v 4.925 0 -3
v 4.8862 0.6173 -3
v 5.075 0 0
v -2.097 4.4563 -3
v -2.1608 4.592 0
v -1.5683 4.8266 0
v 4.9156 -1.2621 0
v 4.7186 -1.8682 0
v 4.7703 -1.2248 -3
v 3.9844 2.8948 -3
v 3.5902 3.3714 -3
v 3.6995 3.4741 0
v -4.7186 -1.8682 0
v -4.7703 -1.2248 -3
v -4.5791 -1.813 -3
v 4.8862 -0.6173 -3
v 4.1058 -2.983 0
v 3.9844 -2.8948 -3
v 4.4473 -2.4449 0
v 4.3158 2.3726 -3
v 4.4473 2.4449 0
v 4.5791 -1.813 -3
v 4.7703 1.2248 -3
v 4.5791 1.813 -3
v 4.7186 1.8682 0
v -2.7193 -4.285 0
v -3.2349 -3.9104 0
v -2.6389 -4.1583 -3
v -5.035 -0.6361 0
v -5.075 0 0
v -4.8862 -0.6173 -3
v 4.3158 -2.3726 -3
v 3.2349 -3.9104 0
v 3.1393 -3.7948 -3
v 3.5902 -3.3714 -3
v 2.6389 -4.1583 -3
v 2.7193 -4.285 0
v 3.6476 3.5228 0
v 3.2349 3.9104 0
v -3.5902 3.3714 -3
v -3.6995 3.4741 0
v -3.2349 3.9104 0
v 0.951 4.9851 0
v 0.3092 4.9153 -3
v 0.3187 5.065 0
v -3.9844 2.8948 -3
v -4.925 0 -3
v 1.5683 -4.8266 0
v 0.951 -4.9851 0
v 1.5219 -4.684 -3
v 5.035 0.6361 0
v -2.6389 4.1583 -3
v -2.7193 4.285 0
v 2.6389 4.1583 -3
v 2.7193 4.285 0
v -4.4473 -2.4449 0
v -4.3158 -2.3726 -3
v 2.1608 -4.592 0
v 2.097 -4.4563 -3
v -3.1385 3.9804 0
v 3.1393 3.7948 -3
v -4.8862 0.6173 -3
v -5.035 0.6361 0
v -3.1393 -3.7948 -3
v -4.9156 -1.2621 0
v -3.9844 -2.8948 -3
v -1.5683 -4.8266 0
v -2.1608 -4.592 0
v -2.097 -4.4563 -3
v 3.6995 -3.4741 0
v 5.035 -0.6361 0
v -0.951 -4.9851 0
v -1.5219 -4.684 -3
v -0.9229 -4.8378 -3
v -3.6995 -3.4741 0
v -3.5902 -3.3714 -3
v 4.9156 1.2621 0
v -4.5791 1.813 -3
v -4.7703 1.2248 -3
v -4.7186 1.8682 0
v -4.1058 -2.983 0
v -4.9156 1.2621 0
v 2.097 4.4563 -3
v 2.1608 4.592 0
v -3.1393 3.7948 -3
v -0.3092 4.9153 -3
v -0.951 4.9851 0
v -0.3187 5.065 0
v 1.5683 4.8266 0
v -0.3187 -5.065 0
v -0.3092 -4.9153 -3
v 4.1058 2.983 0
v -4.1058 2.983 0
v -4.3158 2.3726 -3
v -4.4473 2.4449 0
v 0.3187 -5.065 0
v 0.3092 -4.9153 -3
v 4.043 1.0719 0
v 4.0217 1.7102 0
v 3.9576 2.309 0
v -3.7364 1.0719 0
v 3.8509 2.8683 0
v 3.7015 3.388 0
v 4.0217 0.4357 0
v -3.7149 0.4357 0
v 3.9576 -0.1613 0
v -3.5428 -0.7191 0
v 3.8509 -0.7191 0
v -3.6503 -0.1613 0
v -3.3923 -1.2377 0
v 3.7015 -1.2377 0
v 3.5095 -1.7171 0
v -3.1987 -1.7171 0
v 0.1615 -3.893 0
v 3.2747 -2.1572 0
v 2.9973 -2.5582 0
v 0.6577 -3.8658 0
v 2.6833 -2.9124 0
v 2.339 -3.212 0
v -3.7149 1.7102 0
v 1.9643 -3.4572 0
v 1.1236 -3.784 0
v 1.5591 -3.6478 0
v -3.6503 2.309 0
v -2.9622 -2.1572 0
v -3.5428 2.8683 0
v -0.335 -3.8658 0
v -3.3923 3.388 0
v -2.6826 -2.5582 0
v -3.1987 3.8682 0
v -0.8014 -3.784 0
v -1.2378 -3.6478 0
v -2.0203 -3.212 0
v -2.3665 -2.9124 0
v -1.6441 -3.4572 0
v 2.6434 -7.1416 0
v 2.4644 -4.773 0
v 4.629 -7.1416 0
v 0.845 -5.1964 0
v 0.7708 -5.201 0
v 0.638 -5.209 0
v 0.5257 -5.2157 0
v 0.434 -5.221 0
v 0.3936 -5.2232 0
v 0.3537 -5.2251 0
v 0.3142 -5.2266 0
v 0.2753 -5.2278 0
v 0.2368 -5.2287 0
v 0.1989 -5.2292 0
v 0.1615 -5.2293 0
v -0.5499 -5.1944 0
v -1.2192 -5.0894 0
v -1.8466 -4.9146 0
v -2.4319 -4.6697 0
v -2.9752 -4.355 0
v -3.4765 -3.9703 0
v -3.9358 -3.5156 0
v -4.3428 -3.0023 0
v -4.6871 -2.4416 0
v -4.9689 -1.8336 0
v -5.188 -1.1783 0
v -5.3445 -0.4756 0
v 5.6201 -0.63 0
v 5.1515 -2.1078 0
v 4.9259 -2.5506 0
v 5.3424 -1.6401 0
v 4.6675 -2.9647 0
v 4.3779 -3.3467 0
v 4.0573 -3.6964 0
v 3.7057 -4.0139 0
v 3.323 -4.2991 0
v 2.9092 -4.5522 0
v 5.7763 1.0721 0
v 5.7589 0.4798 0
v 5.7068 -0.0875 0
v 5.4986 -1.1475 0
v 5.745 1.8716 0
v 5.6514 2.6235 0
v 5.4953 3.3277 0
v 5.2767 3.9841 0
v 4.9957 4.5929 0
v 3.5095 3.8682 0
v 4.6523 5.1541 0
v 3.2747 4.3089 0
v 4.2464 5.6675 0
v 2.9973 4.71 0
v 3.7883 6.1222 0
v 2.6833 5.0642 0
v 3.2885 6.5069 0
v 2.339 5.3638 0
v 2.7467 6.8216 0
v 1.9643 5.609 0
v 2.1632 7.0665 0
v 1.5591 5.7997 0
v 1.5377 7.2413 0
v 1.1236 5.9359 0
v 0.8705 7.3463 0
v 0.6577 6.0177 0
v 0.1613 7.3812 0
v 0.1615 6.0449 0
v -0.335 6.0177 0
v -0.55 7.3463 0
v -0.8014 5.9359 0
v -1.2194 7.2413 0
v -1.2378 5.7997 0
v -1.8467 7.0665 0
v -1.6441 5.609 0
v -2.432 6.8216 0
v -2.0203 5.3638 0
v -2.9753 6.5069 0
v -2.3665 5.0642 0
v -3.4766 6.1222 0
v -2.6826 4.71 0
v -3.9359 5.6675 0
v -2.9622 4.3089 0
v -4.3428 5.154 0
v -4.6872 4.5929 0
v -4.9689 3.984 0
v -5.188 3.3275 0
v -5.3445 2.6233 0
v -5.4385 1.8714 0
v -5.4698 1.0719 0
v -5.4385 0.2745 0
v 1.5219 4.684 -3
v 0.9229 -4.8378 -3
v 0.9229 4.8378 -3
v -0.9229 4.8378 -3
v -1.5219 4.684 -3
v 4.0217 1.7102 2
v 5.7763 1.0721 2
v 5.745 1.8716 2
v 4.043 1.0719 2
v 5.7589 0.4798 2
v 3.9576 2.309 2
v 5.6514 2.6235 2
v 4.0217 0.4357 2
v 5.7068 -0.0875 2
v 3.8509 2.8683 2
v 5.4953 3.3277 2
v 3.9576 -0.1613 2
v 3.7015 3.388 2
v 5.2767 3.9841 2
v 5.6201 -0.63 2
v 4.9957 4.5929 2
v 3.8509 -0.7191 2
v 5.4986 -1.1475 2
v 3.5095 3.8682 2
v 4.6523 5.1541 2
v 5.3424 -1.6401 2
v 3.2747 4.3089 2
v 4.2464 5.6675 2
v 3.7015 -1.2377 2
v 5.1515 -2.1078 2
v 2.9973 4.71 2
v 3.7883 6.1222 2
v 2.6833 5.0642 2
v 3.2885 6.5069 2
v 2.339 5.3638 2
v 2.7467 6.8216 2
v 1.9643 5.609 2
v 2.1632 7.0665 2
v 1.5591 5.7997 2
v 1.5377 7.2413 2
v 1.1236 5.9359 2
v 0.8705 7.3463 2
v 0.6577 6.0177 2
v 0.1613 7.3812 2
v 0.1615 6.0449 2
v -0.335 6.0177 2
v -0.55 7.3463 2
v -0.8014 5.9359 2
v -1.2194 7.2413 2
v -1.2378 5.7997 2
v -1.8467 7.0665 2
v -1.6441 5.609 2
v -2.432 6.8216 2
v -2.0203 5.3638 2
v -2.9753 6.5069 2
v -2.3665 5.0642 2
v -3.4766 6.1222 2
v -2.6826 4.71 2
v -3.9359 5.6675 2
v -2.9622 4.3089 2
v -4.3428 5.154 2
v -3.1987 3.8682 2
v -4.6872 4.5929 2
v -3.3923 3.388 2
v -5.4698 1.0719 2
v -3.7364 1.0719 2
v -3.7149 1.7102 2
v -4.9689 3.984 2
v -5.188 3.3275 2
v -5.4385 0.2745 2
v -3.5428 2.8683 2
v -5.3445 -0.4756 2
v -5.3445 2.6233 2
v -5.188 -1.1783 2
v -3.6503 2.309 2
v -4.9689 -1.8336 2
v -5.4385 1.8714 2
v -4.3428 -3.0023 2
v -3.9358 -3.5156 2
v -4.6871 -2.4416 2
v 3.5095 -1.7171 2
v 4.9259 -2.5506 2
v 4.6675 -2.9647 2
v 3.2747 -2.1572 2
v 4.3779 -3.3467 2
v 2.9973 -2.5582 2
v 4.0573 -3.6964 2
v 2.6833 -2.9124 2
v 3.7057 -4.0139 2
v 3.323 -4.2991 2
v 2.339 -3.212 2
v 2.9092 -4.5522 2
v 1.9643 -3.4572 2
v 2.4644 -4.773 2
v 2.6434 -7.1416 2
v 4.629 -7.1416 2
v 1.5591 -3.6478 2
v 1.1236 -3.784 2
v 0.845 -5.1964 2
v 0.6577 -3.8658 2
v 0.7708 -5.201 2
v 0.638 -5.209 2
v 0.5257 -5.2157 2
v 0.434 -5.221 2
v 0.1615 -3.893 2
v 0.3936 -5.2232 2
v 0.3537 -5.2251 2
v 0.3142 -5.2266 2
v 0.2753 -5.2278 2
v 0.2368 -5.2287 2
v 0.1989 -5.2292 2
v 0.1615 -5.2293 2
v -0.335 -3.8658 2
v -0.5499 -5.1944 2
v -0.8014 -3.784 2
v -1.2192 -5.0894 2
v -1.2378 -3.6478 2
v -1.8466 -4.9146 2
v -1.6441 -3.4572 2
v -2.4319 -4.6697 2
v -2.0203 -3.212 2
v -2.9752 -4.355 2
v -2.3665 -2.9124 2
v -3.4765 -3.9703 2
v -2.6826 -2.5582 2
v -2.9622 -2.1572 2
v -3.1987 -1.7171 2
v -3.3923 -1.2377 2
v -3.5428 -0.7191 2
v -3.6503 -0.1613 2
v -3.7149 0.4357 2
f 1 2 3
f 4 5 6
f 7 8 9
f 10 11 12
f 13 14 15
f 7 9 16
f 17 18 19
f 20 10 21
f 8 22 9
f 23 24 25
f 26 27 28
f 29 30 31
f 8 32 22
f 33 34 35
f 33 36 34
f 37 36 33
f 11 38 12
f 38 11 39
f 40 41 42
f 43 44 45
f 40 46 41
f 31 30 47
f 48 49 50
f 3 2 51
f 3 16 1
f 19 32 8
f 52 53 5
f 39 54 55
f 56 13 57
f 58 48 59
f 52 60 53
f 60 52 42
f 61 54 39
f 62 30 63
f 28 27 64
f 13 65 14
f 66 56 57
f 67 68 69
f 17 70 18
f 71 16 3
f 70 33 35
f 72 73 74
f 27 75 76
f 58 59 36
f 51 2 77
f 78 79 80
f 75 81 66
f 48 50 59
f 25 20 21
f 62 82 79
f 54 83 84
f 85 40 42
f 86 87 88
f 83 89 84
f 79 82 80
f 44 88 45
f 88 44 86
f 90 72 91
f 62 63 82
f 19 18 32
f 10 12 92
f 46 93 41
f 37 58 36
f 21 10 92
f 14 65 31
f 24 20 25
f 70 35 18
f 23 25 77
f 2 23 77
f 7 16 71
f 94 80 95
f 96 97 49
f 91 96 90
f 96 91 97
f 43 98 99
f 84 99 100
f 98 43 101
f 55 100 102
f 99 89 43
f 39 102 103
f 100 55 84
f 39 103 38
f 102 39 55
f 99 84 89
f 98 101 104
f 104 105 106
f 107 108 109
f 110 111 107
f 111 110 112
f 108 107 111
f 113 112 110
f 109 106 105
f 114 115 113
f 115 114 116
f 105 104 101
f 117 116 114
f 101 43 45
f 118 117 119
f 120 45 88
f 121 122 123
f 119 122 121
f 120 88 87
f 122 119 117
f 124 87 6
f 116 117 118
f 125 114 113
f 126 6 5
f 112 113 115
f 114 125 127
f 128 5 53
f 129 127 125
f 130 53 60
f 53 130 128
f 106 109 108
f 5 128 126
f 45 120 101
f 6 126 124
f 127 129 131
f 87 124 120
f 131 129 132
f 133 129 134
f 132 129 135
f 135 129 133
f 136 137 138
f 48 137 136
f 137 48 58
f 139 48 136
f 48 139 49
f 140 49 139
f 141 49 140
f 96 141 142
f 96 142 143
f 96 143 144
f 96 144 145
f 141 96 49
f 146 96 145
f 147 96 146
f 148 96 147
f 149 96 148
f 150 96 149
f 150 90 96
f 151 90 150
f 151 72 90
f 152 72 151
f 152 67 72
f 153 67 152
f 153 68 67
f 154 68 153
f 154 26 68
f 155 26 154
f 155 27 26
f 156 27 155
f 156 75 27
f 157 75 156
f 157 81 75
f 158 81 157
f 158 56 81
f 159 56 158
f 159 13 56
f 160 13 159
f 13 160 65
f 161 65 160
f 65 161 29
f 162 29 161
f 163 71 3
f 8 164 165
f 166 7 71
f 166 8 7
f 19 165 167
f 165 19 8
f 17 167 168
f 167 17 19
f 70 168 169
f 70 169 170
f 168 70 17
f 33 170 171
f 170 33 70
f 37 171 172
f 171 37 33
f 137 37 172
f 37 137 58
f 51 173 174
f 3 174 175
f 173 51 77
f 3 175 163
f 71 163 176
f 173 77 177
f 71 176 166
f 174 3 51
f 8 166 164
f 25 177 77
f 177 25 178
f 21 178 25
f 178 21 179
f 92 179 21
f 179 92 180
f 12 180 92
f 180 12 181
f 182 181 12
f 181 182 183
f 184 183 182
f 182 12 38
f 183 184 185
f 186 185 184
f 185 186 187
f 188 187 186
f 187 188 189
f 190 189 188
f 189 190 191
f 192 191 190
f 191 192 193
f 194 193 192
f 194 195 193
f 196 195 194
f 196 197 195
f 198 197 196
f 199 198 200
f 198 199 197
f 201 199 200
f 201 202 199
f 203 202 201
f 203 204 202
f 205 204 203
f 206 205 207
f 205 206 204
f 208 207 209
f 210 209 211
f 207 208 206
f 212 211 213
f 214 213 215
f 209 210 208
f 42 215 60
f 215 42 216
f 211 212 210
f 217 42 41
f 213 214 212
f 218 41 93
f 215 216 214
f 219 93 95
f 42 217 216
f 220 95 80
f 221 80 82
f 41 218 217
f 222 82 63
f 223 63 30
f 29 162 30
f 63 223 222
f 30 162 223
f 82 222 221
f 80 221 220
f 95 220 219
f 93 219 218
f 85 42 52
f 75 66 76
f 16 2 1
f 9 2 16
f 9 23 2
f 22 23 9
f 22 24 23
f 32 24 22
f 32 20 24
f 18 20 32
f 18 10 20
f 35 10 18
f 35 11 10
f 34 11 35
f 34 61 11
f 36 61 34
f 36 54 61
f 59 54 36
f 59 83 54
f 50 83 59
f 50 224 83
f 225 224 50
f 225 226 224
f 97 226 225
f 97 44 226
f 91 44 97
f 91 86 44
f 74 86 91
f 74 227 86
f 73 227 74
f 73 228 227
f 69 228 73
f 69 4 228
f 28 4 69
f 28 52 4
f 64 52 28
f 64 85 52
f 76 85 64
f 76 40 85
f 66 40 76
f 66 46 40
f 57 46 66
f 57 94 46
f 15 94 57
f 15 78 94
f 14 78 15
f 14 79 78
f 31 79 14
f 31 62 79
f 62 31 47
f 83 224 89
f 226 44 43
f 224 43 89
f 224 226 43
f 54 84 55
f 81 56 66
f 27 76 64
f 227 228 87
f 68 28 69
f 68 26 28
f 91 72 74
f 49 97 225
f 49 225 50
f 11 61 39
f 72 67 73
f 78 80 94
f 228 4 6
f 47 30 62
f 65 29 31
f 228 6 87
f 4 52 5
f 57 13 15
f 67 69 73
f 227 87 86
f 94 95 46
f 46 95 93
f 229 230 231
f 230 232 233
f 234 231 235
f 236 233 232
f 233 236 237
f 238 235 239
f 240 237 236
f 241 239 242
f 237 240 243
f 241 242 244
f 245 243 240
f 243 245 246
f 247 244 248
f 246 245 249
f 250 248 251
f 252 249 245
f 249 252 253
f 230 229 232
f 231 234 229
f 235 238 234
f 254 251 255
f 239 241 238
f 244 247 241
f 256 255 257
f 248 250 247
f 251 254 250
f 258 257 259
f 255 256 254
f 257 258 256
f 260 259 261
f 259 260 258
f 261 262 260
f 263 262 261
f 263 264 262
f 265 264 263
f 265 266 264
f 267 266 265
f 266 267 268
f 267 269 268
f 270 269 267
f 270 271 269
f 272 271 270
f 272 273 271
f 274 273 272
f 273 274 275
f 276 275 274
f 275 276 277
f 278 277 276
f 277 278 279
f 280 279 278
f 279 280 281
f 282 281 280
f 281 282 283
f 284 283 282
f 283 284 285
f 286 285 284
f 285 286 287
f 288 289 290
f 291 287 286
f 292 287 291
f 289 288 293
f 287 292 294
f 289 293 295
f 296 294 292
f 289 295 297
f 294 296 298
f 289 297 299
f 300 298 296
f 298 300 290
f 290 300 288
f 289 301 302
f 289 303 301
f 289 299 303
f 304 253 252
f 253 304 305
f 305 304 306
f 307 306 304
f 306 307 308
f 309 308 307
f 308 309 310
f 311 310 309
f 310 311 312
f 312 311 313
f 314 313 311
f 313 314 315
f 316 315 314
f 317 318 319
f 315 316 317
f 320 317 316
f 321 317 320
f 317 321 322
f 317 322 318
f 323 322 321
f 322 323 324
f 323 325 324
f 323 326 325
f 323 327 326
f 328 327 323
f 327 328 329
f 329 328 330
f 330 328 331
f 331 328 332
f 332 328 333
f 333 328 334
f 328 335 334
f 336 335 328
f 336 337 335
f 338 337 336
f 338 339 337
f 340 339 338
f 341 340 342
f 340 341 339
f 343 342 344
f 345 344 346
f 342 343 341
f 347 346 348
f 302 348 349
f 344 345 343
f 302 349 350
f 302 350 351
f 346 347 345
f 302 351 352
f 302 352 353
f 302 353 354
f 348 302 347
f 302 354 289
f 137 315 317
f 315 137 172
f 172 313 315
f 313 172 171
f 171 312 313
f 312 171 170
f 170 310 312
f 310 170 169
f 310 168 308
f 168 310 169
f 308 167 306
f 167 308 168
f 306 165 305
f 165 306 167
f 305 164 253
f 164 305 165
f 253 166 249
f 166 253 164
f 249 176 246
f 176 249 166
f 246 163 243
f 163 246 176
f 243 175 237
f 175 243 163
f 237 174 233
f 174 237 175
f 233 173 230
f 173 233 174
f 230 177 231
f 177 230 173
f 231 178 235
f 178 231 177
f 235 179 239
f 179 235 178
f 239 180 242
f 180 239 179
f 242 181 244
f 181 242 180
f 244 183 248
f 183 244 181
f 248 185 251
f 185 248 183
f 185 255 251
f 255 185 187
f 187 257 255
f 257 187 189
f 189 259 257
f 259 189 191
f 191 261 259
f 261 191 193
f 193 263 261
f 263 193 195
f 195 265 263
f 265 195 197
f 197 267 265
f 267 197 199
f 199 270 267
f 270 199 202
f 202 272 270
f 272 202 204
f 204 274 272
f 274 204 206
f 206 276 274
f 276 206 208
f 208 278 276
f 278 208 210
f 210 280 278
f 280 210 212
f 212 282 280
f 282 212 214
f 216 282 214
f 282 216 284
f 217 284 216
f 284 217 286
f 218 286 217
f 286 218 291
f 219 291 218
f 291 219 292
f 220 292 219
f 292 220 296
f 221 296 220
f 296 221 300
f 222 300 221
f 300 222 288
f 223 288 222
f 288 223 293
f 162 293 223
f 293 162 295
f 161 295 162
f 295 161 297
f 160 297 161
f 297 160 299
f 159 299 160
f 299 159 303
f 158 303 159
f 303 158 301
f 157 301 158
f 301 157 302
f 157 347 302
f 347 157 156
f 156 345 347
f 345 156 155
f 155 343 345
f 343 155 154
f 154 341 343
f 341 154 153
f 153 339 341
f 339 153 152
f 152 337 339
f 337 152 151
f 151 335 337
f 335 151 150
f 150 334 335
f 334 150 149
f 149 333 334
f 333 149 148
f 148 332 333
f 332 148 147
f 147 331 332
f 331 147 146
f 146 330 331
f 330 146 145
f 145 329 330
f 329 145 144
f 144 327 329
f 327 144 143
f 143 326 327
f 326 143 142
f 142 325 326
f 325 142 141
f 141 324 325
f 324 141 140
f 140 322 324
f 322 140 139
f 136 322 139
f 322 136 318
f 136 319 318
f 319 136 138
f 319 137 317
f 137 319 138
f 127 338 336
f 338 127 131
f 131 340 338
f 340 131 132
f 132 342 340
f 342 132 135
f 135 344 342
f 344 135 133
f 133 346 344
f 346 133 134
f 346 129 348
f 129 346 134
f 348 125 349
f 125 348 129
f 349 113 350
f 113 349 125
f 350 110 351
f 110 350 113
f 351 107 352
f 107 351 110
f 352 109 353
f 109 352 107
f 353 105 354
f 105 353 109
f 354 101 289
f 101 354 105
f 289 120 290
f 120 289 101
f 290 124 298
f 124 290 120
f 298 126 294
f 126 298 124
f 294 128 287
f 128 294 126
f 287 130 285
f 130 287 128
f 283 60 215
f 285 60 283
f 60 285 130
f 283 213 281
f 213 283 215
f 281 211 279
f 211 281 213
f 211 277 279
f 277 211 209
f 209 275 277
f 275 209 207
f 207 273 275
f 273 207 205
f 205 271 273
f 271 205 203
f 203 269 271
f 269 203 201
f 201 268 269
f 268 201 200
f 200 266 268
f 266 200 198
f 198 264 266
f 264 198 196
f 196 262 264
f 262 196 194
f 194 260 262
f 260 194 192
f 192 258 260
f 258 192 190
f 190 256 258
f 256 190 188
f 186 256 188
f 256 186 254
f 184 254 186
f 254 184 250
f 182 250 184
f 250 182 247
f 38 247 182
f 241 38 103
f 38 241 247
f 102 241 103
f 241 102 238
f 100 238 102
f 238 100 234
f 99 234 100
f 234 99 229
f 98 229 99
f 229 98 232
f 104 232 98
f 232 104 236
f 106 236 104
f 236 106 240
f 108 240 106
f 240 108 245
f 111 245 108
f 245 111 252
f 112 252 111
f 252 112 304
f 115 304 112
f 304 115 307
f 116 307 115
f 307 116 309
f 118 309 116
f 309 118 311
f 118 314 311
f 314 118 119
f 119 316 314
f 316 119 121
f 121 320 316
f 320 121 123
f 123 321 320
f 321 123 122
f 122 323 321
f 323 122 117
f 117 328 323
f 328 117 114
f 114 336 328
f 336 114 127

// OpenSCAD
$fn = 50;


difference() {
	union() {
		translate(v = [0, 0, -3.0000000000]) {
			cylinder(h = 3, r1 = 4.9250000000, r2 = 5.0750000000);
		}
		linear_extrude(height = 2) {
			text(font = "Impact", halign = "center", size = 12, text = "Q", valign = "center");
		}
	}
	union();
}
